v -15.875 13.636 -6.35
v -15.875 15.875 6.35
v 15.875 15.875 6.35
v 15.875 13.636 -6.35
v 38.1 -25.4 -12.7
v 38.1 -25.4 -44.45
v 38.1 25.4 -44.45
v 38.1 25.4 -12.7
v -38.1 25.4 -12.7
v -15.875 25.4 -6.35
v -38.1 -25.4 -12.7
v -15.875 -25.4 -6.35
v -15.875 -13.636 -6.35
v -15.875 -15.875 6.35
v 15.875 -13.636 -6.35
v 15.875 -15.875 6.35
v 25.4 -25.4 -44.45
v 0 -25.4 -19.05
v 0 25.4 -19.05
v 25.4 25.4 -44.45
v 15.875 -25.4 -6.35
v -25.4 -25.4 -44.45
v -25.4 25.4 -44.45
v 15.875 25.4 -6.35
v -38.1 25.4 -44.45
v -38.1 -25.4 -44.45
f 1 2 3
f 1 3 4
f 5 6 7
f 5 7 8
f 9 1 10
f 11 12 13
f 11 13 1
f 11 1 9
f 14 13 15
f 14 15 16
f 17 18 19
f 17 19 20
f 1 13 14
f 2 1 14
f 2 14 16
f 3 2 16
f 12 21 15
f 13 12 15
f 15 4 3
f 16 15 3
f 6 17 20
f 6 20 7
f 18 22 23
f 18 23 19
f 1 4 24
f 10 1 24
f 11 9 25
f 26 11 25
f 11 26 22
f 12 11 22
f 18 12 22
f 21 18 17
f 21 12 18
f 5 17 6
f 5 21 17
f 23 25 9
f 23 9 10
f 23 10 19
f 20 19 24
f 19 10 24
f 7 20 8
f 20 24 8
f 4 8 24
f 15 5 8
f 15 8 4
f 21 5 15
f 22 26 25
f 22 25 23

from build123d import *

# Parameters (mm, degrees)
F0_W     = 31.75
F0_H     = 12.7
F1_DEPTH = 25.4
F3_DEPTH = 53.976


with BuildPart() as f1:
    # F0 (on Front) → F1 (new body, symmetric)
    with BuildSketch(Plane.XZ):
        Rectangle(F0_W, F0_H)
        Polygon((15.875, -6.35), (-15.875, -6.35), (-38.1, -12.7), (-38.1, -44.45), (-25.4, -44.45), (0, -19.05), (25.4, -44.45), (38.1, -44.45), (38.1, -12.7), align=None)
    extrude(amount=F1_DEPTH, both=True)

    # F2 (on face) → F3 (cut, through all)
    with BuildSketch(Plane.YZ.offset(15.875)):
        Polygon((-13.635647, -6.35), (-15.875, 6.35), (-25.4, 6.35), (-25.4, -6.35), align=None)
        Polygon((25.4, 6.35), (15.875, 6.35), (13.635647, -6.35), (25.4, -6.35), align=None)
    extrude(amount=-F3_DEPTH, mode=Mode.SUBTRACT)


solid = f1.part
